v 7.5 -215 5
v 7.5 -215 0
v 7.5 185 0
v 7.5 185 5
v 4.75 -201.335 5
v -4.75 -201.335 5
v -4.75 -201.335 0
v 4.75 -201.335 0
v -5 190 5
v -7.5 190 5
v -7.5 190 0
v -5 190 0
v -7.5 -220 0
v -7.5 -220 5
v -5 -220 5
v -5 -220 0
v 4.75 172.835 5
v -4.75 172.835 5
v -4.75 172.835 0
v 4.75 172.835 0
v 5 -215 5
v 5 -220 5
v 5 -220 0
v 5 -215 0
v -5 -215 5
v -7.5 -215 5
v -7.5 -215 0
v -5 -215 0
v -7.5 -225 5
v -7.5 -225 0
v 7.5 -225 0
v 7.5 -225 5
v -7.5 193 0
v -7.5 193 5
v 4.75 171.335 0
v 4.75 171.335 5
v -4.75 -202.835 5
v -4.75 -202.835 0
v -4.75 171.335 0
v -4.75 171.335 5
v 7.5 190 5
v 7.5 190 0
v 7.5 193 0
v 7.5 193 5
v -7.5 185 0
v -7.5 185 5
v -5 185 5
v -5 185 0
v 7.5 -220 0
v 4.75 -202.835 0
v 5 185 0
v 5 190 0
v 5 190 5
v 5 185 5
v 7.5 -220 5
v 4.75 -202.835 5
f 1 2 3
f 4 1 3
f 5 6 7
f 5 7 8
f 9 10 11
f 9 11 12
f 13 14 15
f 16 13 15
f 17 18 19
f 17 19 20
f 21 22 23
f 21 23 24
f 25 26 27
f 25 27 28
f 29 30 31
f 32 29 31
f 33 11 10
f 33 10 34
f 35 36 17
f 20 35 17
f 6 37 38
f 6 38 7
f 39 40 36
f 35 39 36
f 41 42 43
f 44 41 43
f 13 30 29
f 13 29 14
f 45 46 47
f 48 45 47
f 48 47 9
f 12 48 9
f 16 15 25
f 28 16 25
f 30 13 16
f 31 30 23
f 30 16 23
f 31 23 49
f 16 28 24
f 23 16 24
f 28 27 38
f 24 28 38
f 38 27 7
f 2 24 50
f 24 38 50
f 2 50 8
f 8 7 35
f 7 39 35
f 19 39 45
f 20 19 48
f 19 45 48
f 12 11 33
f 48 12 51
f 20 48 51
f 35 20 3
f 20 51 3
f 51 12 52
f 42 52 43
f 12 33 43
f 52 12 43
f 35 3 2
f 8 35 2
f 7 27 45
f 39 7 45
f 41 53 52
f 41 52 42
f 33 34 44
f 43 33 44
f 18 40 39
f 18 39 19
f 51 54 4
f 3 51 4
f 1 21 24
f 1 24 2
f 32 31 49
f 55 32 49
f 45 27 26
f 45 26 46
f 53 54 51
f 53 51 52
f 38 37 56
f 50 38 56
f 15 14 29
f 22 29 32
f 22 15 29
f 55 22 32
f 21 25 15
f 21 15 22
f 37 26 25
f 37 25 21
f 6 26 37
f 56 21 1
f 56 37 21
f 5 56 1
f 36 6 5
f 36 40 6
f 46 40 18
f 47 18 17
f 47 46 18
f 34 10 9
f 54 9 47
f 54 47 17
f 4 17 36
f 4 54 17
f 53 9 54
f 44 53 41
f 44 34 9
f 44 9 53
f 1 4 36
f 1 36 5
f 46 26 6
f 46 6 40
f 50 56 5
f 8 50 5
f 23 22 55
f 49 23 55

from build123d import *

# Parameters (mm, degrees)
SKETCH_1_W          = 15
SKETCH_1_H          = 450
EXTRUDE_1_DEPTH     = 5
CUT_EXTRUDE_1_REACH = 7
SKETCH_2_W          = 2.5
SKETCH_2_H          = 5
SKETCH_2_W_2        = 15
SKETCH_2_H_2        = 32
CUT_EXTRUDE_2_REACH = 7
SKETCH_3_W          = 9.5
SKETCH_3_H          = 1.5


with BuildPart() as part:
    # 草图1 → 凸台-拉伸1 (new body)
    with BuildSketch(Plane.XY):
        Rectangle(SKETCH_1_W, SKETCH_1_H)
    extrude(amount=EXTRUDE_1_DEPTH)

    # 草图2 → 切除-拉伸1 (cut, up to next)
    with BuildSketch(Plane.XY.offset(5), mode=Mode.PRIVATE) as cut_extrude_1_sk1:
        with Locations((-6.25, -217.5)):
            Rectangle(SKETCH_2_W, SKETCH_2_H)
    cut_extrude_1_tool1 = extrude(cut_extrude_1_sk1.sketch, amount=-CUT_EXTRUDE_1_REACH, mode=Mode.PRIVATE) & part.part
    add(cut_extrude_1_tool1.solids().sort_by_distance((-6.25, -217.5, 5))[0], mode=Mode.SUBTRACT)
    # 草图2 → 切除-拉伸1 (cut, up to next)
    with BuildSketch(Plane.XY.offset(5), mode=Mode.PRIVATE) as cut_extrude_1_sk2:
        with Locations((6.25, -217.5)):
            Rectangle(SKETCH_2_W, SKETCH_2_H)
    cut_extrude_1_tool2 = extrude(cut_extrude_1_sk2.sketch, amount=-CUT_EXTRUDE_1_REACH, mode=Mode.PRIVATE) & part.part
    add(cut_extrude_1_tool2.solids().sort_by_distance((6.25, -217.5, 5))[0], mode=Mode.SUBTRACT)
    # 草图2 → 切除-拉伸1 (cut, up to next)
    with BuildSketch(Plane.XY.offset(5), mode=Mode.PRIVATE) as cut_extrude_1_sk3:
        with Locations((-6.25, 187.5)):
            Rectangle(SKETCH_2_W, SKETCH_2_H)
    cut_extrude_1_tool3 = extrude(cut_extrude_1_sk3.sketch, amount=-CUT_EXTRUDE_1_REACH, mode=Mode.PRIVATE) & part.part
    add(cut_extrude_1_tool3.solids().sort_by_distance((-6.25, 187.5, 5))[0], mode=Mode.SUBTRACT)
    # 草图2 → 切除-拉伸1 (cut, up to next)
    with BuildSketch(Plane.XY.offset(5), mode=Mode.PRIVATE) as cut_extrude_1_sk4:
        with Locations((6.25, 187.5)):
            Rectangle(SKETCH_2_W, SKETCH_2_H)
    cut_extrude_1_tool4 = extrude(cut_extrude_1_sk4.sketch, amount=-CUT_EXTRUDE_1_REACH, mode=Mode.PRIVATE) & part.part
    add(cut_extrude_1_tool4.solids().sort_by_distance((6.25, 187.5, 5))[0], mode=Mode.SUBTRACT)
    # 草图2 → 切除-拉伸1 (cut, up to next)
    with BuildSketch(Plane.XY.offset(5), mode=Mode.PRIVATE) as cut_extrude_1_sk5:
        with Locations((0, 209)):
            Rectangle(SKETCH_2_W_2, SKETCH_2_H_2)
    cut_extrude_1_tool5 = extrude(cut_extrude_1_sk5.sketch, amount=-CUT_EXTRUDE_1_REACH, mode=Mode.PRIVATE) & part.part
    add(cut_extrude_1_tool5.solids().sort_by_distance((0, 209, 5))[0], mode=Mode.SUBTRACT)

    # 草图3 → 切除-拉伸2 (cut, up to next)
    with BuildSketch(Plane.XY.offset(5), mode=Mode.PRIVATE) as cut_extrude_2_sk1:
        with Locations((0, -202.085)):
            Rectangle(SKETCH_3_W, SKETCH_3_H)
    cut_extrude_2_tool1 = extrude(cut_extrude_2_sk1.sketch, amount=-CUT_EXTRUDE_2_REACH, mode=Mode.PRIVATE) & part.part
    add(cut_extrude_2_tool1.solids().sort_by_distance((0, -202.085, 5))[0], mode=Mode.SUBTRACT)
    # 草图3 → 切除-拉伸2 (cut, up to next)
    with BuildSketch(Plane.XY.offset(5), mode=Mode.PRIVATE) as cut_extrude_2_sk2:
        with Locations((0, 172.085)):
            Rectangle(SKETCH_3_W, SKETCH_3_H)
    cut_extrude_2_tool2 = extrude(cut_extrude_2_sk2.sketch, amount=-CUT_EXTRUDE_2_REACH, mode=Mode.PRIVATE) & part.part
    add(cut_extrude_2_tool2.solids().sort_by_distance((0, 172.085, 5))[0], mode=Mode.SUBTRACT)


solid = part.part
